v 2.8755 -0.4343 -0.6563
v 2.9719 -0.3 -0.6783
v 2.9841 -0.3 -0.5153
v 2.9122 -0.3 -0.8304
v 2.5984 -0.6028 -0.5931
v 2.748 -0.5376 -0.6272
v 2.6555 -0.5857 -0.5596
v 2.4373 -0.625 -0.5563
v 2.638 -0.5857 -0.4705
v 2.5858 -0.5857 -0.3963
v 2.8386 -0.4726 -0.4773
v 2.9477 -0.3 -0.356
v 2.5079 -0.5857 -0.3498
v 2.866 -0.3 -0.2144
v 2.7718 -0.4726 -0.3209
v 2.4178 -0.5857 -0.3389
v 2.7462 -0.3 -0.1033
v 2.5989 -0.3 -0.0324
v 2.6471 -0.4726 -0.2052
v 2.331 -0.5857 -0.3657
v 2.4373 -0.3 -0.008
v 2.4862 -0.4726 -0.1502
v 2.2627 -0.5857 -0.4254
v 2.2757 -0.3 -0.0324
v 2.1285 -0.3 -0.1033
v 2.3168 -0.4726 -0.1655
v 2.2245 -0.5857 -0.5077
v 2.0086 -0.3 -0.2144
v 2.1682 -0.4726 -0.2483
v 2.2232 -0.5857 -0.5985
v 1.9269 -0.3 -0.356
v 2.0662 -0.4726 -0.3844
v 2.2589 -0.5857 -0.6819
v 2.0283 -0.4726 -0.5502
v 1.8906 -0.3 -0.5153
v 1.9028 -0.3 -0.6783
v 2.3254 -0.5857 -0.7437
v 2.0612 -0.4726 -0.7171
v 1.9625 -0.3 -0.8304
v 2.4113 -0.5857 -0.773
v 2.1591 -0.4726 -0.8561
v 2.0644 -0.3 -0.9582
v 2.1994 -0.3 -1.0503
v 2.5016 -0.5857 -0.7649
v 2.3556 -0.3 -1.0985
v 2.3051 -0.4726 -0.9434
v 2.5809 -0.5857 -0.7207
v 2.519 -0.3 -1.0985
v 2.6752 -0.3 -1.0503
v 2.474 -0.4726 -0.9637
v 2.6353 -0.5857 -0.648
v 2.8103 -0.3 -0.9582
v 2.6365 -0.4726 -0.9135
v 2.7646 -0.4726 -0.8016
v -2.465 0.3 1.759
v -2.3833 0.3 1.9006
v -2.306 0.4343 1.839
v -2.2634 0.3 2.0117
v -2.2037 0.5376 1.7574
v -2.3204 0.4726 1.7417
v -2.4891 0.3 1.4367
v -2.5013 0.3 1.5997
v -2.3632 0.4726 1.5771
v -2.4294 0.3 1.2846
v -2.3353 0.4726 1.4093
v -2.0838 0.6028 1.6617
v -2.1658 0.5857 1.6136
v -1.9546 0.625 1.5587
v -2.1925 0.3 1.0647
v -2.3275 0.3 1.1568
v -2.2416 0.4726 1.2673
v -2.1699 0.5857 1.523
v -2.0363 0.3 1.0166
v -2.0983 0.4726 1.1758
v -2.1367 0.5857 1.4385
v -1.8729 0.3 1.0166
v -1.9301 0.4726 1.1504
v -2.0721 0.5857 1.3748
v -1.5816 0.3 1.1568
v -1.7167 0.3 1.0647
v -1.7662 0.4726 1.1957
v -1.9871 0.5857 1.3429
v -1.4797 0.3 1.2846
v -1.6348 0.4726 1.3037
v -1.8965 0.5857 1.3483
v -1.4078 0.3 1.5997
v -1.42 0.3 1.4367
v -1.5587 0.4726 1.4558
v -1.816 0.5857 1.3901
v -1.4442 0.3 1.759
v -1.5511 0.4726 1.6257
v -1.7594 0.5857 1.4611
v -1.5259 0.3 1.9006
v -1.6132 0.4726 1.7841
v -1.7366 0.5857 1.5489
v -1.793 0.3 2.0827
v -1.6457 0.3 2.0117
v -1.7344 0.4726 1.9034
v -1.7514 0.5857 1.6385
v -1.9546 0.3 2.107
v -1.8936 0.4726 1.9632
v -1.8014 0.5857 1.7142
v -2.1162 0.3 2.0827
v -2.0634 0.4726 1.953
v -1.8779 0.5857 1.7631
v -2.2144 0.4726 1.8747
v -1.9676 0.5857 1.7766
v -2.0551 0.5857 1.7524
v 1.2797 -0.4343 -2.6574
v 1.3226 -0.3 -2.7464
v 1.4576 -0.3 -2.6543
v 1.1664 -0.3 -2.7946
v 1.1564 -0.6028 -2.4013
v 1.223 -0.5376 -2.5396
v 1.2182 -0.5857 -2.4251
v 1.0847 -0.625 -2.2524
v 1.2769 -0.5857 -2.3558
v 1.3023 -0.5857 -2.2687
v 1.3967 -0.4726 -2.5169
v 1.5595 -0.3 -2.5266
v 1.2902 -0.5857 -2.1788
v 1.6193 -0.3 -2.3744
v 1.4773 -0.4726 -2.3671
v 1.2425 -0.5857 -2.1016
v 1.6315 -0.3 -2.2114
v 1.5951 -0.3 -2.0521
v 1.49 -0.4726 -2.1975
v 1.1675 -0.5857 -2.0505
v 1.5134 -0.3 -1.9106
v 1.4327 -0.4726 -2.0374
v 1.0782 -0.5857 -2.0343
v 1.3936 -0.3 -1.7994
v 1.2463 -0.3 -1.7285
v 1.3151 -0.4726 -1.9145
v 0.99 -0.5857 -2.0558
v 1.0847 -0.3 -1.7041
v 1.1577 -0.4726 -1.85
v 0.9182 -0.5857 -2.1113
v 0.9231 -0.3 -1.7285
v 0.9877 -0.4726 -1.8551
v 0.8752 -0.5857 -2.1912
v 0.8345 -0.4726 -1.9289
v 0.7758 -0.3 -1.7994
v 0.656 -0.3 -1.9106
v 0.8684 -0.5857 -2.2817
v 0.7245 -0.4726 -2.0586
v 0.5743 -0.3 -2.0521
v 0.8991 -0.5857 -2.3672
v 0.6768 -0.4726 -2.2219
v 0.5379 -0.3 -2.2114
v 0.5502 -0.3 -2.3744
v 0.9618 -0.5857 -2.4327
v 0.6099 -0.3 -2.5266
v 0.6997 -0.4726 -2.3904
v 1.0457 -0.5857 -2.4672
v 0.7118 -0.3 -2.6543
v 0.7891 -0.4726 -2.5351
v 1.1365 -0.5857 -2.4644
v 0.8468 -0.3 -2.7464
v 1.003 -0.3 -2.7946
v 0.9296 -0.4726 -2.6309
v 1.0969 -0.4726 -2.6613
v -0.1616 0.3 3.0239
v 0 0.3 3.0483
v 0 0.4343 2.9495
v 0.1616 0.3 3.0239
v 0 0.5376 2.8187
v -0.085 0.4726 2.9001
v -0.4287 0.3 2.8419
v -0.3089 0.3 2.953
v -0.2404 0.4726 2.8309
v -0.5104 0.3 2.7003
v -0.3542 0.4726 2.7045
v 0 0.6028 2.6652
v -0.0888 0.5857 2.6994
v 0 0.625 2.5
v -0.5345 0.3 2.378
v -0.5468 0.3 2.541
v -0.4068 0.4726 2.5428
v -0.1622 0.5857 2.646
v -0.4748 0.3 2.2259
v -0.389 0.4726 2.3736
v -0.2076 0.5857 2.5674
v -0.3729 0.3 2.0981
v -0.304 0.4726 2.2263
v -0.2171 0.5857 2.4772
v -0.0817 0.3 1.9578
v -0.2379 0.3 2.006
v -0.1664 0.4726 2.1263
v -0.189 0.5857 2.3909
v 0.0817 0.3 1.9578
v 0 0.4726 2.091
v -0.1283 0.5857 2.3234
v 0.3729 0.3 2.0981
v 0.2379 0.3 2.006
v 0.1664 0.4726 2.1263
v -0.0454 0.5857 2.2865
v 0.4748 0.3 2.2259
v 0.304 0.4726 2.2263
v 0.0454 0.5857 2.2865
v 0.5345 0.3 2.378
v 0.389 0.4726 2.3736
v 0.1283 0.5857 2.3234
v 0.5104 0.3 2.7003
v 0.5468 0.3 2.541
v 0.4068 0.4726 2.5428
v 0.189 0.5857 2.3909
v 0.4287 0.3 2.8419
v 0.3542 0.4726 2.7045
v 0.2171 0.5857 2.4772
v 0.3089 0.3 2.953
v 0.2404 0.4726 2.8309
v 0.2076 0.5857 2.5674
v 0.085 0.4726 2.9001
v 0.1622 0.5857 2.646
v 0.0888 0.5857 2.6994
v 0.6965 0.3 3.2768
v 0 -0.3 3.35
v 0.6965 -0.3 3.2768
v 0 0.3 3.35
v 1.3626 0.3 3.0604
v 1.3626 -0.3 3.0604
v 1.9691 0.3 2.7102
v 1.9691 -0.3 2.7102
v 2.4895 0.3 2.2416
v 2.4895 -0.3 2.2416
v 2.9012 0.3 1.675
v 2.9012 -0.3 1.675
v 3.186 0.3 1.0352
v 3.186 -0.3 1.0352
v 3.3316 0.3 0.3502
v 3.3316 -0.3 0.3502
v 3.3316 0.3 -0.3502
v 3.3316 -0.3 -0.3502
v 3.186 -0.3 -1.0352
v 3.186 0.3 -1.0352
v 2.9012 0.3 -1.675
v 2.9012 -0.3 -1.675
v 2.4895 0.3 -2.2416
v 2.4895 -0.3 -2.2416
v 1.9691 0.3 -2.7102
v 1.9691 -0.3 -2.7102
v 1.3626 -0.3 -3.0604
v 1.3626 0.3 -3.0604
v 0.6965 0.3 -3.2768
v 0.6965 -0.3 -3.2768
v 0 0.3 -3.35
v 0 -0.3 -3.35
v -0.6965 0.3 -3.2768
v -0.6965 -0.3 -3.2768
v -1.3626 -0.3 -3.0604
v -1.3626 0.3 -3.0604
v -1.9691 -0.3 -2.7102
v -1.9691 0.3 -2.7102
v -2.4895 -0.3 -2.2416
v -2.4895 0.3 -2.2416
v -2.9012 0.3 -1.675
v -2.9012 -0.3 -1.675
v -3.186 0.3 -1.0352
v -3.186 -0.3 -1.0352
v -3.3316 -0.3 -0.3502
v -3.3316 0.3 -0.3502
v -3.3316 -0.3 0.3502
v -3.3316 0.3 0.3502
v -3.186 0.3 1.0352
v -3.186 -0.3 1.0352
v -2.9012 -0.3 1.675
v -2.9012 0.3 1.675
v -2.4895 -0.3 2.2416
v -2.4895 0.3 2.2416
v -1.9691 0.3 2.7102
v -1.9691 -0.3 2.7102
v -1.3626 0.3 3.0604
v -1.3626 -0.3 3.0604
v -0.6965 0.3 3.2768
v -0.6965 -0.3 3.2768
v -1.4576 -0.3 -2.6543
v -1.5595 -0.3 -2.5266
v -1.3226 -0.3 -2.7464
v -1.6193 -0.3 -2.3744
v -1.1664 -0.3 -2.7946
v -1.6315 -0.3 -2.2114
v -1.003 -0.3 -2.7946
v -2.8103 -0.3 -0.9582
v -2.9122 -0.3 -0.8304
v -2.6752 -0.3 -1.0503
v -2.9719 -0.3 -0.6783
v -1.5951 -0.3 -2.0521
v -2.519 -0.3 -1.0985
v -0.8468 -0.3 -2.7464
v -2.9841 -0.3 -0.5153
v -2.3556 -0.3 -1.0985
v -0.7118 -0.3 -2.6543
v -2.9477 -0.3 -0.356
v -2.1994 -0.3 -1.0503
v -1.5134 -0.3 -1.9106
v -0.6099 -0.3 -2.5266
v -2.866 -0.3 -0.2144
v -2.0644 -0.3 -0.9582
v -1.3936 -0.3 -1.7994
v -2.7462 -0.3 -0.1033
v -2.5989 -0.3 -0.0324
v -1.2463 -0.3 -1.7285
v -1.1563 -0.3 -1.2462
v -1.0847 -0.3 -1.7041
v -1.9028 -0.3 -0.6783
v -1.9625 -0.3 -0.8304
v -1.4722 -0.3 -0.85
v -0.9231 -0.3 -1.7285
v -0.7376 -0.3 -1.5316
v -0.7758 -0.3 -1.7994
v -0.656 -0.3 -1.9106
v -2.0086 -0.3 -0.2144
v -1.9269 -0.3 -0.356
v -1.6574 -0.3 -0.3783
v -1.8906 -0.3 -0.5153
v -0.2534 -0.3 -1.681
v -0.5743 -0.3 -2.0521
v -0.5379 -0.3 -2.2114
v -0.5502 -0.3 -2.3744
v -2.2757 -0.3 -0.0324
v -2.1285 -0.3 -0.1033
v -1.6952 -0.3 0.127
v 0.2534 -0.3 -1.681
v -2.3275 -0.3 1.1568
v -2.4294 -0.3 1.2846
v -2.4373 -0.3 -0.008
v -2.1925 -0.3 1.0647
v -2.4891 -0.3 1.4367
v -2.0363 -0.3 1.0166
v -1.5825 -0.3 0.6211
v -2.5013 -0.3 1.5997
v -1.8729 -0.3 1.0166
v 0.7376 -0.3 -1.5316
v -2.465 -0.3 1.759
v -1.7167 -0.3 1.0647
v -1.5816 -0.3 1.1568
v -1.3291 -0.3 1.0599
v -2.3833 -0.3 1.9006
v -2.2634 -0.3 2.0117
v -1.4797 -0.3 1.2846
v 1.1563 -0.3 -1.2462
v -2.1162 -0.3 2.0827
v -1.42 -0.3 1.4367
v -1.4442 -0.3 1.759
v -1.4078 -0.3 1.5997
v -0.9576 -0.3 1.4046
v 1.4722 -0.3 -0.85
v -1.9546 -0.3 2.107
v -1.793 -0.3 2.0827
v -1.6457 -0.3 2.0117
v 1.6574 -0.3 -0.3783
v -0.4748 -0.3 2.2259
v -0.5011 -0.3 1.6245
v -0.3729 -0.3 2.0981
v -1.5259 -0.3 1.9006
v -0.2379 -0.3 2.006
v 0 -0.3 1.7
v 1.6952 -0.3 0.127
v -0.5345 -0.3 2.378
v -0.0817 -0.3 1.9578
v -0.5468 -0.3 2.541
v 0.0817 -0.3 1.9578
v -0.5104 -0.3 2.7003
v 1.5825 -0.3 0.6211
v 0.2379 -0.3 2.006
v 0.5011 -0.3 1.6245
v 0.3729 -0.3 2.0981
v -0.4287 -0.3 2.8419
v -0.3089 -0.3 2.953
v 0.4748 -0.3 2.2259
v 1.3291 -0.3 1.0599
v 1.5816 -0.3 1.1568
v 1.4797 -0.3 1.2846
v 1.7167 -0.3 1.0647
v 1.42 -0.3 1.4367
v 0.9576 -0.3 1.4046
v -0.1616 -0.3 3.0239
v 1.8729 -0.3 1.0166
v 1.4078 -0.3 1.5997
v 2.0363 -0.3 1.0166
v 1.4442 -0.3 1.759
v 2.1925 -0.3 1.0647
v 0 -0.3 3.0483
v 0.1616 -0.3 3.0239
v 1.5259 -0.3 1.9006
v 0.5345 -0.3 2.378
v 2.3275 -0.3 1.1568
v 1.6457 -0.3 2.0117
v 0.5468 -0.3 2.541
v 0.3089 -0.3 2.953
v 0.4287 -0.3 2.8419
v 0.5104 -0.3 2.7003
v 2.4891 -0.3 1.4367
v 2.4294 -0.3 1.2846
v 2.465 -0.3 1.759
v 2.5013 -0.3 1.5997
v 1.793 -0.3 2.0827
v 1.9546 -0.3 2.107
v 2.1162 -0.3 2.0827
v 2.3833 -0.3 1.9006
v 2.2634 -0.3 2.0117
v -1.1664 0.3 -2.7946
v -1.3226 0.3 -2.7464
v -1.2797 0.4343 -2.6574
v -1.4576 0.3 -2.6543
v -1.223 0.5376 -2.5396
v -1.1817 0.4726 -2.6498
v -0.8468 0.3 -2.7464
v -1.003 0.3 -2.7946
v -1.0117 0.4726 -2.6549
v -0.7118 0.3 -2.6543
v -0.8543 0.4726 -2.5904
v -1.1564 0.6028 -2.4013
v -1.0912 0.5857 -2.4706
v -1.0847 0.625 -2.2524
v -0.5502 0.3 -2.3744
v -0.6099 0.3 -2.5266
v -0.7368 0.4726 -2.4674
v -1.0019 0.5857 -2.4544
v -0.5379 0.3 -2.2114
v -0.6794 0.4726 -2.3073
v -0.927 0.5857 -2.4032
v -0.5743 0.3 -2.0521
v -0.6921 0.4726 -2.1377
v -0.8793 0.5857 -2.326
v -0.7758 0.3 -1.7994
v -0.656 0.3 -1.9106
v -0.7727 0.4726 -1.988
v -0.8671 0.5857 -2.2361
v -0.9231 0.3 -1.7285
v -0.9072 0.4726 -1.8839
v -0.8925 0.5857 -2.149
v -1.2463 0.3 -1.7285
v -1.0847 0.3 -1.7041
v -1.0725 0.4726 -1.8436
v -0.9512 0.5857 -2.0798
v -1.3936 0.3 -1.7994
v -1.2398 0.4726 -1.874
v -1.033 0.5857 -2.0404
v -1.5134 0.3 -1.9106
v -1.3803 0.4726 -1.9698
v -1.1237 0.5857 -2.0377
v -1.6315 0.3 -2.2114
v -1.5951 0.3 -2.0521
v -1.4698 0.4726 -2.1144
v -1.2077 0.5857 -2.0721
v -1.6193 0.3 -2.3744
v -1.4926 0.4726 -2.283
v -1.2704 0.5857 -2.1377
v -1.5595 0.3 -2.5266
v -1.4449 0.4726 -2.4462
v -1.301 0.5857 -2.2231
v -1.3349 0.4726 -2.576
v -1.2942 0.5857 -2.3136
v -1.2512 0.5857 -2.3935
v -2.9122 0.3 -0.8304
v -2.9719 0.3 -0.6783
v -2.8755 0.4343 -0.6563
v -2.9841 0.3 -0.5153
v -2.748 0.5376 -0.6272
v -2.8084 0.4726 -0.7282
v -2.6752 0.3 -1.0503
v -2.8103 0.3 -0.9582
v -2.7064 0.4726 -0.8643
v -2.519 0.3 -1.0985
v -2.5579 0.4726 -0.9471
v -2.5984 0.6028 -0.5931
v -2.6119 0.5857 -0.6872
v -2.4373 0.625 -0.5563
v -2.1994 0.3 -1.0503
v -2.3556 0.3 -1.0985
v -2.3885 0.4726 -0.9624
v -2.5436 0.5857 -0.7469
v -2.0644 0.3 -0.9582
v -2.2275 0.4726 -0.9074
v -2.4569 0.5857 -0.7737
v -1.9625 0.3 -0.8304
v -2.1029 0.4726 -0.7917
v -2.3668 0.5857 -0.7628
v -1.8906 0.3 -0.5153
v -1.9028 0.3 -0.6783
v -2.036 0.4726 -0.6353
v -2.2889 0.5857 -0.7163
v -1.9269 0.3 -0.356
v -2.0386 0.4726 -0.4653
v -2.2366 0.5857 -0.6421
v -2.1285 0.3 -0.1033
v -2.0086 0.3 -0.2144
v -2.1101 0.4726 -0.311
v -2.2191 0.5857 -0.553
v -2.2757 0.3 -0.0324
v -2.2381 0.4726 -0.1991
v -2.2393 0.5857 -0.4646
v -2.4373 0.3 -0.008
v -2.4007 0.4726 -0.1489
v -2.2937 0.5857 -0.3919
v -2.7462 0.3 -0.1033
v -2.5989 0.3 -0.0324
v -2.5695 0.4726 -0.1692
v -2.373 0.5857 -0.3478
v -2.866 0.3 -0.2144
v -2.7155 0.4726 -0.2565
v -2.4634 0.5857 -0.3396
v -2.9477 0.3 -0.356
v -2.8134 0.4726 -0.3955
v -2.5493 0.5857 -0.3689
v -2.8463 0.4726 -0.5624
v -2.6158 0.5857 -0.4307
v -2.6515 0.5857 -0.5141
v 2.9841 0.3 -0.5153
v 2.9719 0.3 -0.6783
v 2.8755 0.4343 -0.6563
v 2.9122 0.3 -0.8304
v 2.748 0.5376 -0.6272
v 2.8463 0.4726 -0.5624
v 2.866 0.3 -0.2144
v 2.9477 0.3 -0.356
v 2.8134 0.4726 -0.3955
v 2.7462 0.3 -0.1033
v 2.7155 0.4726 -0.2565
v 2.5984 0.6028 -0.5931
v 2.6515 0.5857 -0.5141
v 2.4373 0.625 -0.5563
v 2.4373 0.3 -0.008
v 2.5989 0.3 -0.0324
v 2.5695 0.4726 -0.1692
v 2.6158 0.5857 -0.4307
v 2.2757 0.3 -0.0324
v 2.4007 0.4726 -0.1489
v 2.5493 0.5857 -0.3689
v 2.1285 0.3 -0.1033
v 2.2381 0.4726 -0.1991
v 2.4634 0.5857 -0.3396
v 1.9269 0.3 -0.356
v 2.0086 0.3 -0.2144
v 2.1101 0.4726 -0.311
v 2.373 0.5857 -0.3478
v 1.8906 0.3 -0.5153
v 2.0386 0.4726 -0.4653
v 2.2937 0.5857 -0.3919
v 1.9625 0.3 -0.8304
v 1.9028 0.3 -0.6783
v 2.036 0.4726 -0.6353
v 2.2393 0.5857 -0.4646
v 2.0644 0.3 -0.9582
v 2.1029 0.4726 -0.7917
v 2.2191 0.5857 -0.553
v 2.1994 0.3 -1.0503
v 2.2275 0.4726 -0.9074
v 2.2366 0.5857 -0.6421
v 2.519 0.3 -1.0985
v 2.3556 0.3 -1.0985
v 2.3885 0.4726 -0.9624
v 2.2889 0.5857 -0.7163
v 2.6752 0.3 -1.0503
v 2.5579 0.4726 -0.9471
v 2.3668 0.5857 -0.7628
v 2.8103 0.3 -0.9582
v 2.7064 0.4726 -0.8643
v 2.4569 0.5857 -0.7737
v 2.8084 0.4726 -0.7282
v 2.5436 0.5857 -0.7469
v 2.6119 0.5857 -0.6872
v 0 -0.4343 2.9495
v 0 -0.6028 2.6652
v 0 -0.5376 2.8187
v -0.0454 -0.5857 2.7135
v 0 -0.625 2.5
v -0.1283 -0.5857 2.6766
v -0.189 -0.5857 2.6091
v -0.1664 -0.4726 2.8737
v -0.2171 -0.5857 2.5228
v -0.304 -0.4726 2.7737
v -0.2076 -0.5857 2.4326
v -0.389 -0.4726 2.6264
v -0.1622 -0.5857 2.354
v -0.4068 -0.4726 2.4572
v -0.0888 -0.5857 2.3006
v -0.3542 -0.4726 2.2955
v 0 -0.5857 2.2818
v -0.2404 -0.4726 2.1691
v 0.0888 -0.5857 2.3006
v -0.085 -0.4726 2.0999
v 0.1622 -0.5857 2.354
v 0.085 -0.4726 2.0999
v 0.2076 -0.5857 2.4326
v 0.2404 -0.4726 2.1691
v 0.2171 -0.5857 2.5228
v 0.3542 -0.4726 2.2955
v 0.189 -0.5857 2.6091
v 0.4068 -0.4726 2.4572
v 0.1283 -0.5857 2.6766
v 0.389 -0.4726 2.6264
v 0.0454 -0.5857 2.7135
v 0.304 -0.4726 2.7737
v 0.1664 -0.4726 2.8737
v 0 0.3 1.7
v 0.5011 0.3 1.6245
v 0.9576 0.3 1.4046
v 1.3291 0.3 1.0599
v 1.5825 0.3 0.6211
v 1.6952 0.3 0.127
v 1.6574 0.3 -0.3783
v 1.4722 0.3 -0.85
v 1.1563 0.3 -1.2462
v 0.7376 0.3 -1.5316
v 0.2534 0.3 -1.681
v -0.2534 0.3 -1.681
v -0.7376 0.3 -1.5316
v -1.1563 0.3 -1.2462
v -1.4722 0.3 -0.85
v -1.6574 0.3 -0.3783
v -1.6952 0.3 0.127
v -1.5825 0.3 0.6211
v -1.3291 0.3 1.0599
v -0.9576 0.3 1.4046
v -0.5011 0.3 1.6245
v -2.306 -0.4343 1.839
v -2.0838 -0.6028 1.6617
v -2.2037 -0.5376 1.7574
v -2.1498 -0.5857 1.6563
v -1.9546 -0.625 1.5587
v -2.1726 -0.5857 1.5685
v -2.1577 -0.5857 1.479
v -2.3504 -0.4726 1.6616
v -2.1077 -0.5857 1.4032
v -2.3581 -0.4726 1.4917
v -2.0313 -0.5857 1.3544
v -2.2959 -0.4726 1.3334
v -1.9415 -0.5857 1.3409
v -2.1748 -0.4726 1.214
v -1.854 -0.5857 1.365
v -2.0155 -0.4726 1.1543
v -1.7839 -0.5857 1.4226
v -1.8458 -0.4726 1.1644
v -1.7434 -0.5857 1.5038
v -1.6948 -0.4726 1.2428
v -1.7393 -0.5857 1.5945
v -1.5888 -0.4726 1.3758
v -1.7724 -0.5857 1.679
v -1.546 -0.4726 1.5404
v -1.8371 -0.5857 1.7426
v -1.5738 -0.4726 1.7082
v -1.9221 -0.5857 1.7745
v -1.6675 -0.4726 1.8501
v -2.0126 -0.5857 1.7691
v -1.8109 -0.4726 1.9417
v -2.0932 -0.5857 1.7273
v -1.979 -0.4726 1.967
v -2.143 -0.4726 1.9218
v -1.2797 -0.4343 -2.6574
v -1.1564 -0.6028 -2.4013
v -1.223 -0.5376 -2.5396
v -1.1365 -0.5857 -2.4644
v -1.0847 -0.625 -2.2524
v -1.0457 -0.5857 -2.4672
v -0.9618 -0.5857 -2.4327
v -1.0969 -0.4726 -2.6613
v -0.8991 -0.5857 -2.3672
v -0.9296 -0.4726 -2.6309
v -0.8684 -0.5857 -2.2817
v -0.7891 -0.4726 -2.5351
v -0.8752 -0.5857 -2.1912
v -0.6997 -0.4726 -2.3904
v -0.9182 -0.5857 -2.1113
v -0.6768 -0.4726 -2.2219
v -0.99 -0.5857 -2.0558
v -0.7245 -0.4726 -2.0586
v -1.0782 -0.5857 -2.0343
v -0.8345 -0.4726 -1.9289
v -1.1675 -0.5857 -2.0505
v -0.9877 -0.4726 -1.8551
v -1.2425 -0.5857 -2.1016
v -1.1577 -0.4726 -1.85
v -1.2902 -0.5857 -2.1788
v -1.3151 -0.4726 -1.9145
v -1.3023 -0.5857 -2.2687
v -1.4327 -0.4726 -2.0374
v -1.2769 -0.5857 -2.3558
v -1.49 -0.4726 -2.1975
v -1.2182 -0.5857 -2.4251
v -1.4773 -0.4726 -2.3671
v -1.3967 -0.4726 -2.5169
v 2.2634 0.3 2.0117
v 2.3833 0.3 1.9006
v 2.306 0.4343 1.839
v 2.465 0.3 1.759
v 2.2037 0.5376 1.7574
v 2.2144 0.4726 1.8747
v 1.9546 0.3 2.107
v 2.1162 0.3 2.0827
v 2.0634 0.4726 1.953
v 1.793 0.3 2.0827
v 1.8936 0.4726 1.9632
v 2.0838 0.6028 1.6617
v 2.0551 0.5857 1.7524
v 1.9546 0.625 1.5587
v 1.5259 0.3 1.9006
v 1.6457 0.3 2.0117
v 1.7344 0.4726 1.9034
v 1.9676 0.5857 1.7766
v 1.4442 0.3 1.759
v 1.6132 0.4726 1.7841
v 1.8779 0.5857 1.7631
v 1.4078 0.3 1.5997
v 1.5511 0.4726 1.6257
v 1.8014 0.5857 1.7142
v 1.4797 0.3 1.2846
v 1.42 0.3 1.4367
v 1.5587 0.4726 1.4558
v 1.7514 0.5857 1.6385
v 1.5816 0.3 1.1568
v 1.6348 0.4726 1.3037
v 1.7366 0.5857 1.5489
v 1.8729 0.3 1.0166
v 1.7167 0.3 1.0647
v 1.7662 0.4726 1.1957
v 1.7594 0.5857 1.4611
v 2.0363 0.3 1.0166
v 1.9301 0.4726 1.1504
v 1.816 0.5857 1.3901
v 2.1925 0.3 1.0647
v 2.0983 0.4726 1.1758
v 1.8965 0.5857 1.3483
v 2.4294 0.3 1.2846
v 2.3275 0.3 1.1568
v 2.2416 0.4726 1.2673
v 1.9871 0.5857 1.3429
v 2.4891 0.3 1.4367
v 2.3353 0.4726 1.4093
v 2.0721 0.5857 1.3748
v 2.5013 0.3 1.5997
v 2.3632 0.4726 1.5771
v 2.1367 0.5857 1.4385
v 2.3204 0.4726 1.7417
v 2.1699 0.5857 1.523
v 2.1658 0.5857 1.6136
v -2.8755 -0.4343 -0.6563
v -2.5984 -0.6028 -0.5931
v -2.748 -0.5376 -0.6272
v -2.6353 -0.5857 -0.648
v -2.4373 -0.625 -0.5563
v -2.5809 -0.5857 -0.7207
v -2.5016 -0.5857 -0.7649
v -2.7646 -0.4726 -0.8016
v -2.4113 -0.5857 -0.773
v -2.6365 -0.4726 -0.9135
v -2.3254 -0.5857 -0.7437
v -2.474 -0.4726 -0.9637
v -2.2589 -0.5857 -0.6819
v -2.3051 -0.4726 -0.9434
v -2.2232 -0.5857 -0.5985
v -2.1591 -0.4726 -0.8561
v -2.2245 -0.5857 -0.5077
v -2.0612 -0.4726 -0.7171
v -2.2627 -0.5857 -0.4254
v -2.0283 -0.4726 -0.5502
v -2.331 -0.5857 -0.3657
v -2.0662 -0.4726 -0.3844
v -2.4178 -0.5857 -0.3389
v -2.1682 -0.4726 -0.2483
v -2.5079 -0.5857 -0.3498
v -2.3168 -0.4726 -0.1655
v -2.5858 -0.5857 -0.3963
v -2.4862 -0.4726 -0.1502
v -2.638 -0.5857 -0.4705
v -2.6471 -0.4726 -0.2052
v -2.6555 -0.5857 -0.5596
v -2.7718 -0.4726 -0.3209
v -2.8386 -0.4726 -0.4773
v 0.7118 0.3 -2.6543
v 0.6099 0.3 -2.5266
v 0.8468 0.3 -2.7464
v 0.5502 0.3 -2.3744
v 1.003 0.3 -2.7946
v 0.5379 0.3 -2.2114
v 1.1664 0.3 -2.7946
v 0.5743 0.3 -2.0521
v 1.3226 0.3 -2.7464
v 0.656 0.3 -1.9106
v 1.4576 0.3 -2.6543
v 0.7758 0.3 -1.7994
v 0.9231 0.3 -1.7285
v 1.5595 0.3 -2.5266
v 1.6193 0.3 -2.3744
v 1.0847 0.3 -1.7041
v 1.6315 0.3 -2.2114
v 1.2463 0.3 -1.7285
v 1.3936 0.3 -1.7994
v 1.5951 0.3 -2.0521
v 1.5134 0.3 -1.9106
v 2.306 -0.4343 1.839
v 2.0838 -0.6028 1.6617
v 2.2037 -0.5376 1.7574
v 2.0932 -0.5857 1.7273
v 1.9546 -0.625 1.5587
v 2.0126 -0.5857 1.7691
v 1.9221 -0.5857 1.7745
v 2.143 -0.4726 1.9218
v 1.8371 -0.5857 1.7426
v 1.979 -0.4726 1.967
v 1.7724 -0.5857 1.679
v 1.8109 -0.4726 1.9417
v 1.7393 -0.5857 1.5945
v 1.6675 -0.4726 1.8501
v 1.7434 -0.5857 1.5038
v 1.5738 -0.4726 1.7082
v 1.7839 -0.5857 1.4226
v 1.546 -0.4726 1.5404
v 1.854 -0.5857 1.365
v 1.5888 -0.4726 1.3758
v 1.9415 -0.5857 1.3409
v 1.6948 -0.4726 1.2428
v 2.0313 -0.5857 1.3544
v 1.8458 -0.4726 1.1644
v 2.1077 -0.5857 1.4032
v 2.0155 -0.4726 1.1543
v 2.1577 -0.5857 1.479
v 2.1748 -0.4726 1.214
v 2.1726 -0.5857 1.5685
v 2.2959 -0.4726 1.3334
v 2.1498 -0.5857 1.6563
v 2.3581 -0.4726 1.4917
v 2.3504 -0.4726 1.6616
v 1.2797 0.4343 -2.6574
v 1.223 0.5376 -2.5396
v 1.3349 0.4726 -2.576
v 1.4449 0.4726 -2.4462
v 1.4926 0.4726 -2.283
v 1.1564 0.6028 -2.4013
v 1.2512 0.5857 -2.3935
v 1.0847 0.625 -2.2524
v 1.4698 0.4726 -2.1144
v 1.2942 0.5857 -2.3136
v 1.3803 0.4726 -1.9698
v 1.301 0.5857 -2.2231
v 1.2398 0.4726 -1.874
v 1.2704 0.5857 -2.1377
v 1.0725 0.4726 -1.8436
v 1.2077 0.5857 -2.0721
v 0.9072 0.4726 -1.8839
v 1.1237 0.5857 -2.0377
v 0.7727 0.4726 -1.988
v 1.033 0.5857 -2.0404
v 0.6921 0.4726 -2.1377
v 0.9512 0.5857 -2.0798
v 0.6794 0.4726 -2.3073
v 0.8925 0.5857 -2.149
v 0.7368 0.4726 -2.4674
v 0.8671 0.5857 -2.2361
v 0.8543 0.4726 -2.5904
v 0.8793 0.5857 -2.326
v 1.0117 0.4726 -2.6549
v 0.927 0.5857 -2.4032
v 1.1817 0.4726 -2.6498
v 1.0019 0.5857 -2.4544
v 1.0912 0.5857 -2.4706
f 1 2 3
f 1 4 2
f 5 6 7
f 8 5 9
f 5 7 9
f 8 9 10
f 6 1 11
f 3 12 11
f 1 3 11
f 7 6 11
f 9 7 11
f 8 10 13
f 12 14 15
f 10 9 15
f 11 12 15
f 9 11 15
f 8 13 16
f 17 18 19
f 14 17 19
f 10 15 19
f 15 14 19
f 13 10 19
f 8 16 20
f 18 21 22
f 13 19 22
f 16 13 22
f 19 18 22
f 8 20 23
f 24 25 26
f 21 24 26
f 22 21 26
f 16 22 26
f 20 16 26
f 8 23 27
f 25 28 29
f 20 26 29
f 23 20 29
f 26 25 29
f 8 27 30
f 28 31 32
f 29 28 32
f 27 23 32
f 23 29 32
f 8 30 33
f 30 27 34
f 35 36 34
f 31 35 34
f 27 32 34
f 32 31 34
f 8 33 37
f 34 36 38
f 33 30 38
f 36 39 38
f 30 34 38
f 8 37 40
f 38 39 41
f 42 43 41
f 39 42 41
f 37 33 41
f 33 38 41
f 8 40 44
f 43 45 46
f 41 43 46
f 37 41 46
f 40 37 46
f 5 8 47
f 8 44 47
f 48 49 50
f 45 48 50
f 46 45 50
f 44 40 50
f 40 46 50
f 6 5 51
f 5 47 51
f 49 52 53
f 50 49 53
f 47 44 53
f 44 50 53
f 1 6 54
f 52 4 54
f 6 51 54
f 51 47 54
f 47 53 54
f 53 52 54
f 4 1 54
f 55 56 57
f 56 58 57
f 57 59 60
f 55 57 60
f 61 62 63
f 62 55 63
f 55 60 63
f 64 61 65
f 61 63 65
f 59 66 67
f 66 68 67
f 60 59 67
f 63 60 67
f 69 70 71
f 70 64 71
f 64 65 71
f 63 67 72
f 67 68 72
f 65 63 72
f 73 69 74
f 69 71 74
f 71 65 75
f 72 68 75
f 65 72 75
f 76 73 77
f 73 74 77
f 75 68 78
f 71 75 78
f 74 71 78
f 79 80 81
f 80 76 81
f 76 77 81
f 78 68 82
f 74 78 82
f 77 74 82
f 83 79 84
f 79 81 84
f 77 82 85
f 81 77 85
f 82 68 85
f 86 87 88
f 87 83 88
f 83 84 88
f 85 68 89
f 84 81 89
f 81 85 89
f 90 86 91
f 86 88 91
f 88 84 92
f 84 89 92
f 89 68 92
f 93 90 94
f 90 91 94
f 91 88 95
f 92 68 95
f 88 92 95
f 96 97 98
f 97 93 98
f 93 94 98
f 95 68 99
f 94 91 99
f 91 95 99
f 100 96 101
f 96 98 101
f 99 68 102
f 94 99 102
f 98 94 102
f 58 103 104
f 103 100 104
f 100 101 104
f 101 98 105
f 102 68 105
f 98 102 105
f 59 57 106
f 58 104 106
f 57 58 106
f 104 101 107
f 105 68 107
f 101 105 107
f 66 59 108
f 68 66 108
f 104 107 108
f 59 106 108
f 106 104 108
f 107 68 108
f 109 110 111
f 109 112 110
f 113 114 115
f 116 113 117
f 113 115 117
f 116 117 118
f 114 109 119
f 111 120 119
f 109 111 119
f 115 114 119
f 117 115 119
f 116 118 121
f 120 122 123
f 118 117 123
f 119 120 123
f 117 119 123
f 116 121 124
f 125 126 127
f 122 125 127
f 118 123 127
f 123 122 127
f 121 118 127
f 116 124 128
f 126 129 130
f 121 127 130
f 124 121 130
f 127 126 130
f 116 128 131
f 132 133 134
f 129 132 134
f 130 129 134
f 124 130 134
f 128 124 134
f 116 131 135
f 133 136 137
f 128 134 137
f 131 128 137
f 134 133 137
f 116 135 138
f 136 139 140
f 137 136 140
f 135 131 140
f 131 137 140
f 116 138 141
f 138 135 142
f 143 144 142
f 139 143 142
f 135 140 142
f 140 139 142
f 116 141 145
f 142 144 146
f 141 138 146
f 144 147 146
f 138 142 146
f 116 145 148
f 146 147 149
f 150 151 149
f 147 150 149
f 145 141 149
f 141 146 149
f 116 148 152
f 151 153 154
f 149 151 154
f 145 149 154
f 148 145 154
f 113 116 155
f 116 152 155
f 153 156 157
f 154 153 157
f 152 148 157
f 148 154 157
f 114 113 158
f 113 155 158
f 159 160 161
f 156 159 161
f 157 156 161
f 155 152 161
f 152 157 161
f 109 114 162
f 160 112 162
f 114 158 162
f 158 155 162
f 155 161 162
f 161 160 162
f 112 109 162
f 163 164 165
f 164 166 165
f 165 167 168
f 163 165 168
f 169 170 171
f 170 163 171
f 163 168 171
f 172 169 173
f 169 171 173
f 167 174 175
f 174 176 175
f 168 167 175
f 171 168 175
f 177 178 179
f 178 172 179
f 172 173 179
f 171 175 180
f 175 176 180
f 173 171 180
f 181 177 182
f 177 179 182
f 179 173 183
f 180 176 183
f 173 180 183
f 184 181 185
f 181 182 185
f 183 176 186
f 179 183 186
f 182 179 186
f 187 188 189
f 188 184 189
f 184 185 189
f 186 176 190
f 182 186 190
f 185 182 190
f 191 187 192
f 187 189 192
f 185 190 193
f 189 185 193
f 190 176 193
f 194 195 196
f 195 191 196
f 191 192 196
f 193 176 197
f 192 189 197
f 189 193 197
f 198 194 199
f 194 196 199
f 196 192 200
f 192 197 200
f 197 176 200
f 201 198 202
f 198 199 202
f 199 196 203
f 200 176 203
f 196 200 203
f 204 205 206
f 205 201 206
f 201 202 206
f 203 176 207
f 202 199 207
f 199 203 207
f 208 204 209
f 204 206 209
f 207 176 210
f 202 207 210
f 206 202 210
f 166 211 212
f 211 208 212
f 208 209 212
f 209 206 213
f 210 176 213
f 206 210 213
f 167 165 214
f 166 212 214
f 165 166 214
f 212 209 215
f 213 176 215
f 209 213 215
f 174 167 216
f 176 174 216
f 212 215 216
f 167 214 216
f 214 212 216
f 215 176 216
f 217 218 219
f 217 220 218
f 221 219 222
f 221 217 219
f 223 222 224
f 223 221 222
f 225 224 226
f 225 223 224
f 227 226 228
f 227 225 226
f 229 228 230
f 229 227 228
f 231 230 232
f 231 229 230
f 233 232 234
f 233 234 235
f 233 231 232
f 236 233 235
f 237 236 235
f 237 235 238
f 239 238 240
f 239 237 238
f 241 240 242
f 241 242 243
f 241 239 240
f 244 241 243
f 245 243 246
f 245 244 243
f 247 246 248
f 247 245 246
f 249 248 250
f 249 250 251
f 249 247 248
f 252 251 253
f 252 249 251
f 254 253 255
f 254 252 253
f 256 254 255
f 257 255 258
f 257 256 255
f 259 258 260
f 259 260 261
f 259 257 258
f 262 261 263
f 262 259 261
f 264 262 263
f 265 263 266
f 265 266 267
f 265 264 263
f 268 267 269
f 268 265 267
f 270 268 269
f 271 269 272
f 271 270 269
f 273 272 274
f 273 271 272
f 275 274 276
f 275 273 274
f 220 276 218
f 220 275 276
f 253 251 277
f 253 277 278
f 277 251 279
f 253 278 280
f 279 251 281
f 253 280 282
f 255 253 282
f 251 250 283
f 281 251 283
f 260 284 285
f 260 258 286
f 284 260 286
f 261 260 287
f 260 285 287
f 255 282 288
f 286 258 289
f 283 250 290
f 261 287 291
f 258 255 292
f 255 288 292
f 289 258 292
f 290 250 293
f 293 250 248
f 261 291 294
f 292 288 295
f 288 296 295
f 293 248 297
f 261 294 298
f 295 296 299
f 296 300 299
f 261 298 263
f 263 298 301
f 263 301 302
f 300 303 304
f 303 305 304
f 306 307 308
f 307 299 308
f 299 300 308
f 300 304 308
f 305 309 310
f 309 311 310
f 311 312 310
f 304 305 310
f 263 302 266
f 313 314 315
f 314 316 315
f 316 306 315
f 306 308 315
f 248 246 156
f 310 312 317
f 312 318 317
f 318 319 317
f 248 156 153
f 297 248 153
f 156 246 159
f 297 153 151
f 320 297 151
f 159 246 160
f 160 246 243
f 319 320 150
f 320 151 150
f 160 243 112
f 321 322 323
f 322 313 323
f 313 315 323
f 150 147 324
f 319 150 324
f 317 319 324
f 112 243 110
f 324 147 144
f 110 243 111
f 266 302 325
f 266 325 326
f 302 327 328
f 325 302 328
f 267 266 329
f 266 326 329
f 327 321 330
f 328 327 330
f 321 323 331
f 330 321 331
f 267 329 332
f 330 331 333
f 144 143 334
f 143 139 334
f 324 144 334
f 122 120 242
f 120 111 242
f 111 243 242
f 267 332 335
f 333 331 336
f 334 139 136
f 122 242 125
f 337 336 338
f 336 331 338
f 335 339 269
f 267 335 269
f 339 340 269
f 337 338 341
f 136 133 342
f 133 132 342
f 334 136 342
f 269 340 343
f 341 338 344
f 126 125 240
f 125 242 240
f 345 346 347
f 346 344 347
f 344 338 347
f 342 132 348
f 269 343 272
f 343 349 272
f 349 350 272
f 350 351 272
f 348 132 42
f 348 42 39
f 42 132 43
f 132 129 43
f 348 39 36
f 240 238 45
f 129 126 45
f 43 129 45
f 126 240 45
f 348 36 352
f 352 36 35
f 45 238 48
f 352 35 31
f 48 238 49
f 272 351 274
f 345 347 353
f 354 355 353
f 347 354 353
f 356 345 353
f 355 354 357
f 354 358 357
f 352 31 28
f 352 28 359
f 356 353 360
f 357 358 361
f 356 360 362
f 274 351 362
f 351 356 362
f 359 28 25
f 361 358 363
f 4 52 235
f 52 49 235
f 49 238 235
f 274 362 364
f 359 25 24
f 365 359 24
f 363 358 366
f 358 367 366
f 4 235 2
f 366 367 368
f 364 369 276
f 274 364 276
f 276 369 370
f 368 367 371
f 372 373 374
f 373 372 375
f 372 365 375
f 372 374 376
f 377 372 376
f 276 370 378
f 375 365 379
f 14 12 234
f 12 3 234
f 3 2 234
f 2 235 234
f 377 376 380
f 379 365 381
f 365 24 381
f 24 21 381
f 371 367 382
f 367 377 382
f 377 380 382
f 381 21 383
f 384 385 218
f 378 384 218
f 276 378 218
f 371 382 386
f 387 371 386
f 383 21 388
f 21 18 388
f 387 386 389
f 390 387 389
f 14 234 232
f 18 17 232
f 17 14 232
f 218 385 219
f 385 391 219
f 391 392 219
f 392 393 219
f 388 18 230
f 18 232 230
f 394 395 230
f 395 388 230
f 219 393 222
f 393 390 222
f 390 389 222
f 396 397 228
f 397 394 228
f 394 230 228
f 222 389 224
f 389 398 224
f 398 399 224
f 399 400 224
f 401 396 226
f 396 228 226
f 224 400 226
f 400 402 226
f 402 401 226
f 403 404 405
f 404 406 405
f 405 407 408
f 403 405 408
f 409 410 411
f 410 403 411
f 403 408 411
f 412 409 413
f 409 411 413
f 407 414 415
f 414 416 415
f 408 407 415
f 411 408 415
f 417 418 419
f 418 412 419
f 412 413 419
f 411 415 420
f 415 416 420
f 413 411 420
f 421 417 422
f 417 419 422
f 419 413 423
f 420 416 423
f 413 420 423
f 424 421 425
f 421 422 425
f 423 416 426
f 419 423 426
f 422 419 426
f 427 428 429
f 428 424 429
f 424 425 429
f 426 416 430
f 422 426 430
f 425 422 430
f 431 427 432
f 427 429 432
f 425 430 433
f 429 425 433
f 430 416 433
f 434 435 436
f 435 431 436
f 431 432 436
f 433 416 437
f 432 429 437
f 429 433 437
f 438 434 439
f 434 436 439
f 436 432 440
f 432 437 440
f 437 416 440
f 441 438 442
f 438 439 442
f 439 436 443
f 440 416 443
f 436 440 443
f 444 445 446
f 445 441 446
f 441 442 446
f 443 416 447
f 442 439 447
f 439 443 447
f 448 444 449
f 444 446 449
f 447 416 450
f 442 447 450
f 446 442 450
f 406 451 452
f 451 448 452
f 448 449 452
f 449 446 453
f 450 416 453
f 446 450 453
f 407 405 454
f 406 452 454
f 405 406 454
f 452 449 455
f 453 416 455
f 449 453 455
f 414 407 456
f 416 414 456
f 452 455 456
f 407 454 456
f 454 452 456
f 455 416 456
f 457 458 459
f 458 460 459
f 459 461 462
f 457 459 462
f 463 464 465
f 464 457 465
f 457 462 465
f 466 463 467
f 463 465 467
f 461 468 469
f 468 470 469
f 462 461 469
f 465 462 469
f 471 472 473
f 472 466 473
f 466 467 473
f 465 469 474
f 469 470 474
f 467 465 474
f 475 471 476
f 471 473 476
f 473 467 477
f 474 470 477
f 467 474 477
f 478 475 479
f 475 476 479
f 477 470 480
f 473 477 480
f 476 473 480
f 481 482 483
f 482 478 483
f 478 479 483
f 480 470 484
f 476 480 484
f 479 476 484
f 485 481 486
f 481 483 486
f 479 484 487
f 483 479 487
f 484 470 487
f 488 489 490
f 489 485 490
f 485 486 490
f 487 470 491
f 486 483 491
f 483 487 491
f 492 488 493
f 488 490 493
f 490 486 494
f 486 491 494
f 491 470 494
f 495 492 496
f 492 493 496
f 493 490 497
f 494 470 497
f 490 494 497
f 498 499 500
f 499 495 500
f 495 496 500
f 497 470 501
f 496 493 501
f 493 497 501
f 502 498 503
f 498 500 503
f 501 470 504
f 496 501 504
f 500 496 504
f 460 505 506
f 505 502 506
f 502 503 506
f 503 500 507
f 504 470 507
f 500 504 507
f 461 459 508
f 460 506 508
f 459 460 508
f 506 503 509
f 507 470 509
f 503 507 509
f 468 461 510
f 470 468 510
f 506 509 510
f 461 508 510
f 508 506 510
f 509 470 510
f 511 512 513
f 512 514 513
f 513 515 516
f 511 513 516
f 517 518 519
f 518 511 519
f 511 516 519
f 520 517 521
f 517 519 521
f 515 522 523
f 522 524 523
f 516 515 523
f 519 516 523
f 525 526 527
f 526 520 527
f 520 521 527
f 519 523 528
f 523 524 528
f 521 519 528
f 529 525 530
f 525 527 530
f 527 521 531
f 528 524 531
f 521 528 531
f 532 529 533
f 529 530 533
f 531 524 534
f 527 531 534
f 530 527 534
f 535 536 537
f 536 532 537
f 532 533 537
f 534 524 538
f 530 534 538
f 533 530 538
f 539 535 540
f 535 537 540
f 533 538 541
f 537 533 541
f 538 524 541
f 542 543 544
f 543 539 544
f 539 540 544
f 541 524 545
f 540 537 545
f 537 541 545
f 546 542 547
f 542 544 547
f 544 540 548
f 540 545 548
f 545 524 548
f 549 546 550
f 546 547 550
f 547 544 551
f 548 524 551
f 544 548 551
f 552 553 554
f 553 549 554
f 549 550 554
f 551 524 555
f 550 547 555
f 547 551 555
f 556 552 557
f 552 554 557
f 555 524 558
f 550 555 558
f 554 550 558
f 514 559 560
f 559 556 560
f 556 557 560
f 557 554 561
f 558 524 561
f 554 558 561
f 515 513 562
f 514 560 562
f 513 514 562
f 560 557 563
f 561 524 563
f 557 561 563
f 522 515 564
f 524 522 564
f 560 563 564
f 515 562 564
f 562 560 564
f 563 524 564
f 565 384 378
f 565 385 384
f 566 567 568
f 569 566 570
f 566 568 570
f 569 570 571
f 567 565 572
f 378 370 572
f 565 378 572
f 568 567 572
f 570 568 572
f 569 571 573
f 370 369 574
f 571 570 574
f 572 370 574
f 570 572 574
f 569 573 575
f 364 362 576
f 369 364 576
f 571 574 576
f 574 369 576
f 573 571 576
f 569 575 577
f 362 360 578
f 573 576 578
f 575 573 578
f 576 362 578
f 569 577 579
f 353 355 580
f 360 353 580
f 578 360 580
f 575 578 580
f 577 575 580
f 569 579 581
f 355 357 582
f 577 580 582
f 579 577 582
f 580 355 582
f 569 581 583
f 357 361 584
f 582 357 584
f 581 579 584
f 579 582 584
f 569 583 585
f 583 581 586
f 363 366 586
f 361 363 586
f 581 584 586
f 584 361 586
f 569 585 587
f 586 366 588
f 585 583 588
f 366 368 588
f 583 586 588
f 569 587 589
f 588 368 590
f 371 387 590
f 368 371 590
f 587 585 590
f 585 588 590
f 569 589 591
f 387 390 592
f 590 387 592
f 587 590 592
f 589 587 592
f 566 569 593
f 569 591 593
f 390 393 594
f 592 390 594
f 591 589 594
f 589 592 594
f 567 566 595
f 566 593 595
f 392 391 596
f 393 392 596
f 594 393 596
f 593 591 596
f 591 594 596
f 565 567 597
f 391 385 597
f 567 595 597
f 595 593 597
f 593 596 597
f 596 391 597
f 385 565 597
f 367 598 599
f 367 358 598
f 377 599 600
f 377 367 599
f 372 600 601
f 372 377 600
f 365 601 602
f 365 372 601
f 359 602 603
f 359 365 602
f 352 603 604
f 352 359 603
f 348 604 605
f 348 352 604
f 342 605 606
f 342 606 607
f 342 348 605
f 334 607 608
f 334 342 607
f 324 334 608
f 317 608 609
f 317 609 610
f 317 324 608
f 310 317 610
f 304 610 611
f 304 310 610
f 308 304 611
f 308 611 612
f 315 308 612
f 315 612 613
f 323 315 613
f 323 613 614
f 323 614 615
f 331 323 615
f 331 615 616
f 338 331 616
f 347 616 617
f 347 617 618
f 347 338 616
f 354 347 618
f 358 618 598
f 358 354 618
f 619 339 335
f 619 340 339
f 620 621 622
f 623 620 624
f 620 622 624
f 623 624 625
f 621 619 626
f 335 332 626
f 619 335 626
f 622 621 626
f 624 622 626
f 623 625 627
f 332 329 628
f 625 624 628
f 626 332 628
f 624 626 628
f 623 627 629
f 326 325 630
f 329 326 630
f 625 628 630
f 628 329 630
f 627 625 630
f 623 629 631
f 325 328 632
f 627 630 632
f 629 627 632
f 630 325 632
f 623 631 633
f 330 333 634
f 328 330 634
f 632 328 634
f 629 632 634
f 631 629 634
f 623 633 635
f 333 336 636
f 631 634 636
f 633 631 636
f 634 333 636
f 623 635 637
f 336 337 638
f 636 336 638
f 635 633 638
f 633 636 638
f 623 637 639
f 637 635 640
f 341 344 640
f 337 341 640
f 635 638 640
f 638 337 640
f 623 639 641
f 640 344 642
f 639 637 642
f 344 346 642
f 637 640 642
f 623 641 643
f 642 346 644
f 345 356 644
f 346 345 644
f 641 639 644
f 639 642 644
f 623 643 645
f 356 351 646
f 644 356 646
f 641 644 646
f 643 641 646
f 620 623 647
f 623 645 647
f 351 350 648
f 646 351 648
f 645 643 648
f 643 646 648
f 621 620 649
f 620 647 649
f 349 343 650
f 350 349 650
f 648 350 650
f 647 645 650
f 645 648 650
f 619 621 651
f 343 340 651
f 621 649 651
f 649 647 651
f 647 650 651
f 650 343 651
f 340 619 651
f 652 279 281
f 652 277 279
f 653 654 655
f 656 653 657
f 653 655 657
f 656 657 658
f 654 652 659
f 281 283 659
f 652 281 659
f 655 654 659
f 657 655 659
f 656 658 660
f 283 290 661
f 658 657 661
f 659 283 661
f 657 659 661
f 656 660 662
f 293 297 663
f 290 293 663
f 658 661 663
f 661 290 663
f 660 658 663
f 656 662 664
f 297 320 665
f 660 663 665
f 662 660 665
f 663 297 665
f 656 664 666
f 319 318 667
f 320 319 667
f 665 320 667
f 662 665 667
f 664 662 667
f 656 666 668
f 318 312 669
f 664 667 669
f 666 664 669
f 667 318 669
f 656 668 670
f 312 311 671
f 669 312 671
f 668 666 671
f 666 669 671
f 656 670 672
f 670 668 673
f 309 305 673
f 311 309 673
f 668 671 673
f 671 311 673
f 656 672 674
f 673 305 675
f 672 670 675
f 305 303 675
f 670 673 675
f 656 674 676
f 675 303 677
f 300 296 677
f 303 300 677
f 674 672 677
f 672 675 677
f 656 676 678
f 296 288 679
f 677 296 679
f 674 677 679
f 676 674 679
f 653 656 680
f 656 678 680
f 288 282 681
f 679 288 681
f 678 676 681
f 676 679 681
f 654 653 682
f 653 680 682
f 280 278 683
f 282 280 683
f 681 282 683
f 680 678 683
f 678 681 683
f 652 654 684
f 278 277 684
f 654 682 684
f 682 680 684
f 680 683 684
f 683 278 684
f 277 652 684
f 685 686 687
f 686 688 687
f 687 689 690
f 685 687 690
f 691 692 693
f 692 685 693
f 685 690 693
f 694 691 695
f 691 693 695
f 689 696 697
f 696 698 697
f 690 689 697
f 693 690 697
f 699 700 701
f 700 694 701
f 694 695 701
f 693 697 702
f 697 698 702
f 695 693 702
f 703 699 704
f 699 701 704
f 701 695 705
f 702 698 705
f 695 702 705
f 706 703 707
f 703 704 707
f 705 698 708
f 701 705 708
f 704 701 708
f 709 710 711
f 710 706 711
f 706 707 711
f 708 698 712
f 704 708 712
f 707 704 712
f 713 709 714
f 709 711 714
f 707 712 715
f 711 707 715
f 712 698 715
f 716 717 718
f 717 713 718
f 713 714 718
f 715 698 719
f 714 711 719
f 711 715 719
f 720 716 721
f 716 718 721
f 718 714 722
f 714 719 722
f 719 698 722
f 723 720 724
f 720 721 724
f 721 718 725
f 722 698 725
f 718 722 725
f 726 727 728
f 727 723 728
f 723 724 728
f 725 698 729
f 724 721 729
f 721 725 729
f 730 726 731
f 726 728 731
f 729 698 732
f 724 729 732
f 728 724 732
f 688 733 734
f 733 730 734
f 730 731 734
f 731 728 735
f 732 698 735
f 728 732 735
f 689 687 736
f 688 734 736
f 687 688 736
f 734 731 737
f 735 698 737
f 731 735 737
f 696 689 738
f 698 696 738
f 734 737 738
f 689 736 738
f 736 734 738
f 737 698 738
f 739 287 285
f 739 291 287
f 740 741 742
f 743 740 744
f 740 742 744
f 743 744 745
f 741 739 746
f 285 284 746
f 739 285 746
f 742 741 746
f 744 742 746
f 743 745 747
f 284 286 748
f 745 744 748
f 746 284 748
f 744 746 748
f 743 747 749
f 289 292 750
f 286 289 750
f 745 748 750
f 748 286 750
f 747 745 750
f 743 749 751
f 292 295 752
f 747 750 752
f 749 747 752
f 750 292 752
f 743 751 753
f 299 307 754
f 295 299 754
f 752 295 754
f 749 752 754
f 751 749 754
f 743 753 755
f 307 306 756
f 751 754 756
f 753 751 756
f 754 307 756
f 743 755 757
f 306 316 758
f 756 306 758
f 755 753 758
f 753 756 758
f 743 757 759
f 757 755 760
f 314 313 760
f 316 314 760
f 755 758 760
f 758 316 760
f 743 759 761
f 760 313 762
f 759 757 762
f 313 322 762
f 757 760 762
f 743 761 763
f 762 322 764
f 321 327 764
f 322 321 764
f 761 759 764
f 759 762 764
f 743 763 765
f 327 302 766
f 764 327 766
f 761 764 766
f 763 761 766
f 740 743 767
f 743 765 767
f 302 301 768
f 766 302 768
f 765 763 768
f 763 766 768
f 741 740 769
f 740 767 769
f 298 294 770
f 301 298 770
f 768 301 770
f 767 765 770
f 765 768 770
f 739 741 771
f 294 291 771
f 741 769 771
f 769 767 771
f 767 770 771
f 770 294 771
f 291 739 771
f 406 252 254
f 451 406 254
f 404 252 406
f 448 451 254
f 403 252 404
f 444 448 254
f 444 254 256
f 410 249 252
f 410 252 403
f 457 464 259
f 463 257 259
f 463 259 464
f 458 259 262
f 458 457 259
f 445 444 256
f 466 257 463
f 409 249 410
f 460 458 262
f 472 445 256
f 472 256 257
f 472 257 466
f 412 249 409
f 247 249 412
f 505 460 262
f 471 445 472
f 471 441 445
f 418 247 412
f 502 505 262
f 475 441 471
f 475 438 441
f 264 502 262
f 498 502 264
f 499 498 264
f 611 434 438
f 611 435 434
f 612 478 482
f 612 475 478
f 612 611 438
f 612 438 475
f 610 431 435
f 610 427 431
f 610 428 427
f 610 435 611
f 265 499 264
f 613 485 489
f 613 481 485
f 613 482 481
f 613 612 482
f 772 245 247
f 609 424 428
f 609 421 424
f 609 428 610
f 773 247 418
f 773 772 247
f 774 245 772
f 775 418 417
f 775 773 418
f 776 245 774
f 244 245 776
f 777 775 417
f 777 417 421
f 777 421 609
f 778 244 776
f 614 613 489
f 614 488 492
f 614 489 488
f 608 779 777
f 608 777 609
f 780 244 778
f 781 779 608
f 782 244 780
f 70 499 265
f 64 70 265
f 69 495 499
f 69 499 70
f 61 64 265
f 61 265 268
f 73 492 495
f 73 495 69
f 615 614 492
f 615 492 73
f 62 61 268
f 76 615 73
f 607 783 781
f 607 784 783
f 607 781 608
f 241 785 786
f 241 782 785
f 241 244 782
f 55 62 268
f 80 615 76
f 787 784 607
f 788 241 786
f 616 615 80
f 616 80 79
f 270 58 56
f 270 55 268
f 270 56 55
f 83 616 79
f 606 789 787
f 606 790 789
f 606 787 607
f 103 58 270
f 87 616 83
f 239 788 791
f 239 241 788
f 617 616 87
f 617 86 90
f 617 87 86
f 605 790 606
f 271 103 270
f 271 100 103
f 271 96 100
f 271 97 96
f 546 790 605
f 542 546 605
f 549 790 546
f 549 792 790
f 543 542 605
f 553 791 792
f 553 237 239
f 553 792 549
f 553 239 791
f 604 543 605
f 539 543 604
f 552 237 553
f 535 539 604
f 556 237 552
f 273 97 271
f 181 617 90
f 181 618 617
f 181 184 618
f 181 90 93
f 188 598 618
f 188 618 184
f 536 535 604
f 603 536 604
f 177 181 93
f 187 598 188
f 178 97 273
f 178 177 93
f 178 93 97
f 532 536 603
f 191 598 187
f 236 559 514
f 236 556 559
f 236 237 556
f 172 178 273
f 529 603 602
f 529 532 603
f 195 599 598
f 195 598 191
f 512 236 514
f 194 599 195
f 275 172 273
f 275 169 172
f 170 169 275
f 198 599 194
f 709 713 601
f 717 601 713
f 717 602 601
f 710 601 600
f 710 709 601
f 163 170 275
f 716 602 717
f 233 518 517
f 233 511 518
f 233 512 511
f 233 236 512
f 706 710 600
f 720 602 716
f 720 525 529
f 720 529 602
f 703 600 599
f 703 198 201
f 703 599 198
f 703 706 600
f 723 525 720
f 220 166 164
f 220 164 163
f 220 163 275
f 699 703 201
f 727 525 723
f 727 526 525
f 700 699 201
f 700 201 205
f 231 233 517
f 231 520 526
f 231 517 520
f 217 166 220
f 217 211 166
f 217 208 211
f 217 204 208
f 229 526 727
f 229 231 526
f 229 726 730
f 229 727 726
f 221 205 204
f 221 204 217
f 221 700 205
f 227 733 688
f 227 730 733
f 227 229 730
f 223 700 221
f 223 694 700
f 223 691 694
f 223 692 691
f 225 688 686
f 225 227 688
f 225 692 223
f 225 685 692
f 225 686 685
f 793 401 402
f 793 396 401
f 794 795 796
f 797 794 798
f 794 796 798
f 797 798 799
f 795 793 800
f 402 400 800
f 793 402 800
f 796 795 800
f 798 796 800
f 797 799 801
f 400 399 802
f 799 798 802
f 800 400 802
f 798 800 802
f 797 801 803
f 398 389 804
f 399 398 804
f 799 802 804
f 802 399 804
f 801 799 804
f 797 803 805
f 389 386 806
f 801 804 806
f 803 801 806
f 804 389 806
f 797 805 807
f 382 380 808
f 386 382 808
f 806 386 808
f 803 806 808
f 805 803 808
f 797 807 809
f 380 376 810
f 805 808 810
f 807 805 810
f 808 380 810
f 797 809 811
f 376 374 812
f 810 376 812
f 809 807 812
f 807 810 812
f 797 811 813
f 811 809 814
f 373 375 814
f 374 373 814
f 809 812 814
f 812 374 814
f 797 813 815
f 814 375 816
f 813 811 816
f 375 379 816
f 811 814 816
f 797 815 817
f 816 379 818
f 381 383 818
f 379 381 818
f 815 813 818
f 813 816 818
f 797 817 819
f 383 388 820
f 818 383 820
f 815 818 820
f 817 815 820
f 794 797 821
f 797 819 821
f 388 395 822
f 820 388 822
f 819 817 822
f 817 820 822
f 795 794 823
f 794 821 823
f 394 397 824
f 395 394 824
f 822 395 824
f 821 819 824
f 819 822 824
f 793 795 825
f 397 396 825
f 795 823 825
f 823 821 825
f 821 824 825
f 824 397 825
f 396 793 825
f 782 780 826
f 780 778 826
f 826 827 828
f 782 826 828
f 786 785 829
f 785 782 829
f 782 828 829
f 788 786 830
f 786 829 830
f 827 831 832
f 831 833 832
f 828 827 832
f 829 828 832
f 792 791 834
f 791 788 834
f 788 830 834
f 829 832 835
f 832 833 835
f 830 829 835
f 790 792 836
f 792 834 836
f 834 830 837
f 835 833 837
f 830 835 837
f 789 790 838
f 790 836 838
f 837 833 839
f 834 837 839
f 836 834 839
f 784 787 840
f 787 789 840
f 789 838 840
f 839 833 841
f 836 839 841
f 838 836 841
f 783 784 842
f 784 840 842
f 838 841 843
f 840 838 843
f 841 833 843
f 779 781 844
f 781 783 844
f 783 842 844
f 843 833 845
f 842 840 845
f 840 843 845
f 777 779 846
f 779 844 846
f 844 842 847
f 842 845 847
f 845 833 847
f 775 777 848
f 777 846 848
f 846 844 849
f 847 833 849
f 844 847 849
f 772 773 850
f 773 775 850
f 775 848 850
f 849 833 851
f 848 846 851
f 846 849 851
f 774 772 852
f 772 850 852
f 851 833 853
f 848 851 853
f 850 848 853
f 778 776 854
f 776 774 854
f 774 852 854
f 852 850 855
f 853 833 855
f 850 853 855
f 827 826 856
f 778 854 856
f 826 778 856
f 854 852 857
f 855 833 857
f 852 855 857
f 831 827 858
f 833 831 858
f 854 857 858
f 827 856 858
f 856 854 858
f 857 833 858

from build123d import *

# Parameters (mm, degrees)
SKETCH2_R           = 3.35
SKETCH2_R_2         = 1.7
BOSS_EXTRUDE1_DEPTH = 0.3
CIRPATTERN2_COUNT   = 7


with BuildPart() as part:
    # Sketch1 → Revolve1 (revolve)
    with BuildSketch(Plane(origin=(0, 0, 0), x_dir=(0, 0, -1), z_dir=(1, 0, 0))):
        with BuildLine():
            Line((-2.5, 0.625), (-2.5, -0.625))
            ThreePointArc((-2.5, -0.625), (-3.125, 0), (-2.5, 0.625))
        make_face()
    revolve1 = revolve(axis=Axis((0, 0.625, 2.5), (0, -1, 0)))

    # Sketch2 → Boss-Extrude1 (add, symmetric)
    with BuildSketch(Plane(origin=(0, 0, 0), x_dir=(1, 0, 0), z_dir=(0, 1, 0))):
        Circle(SKETCH2_R)
        Circle(SKETCH2_R_2, mode=Mode.SUBTRACT)
    extrude(amount=BOSS_EXTRUDE1_DEPTH, both=True)

    # CirPattern2: Revolve1 ×7 about axis
    cirpattern2_axis = Axis((0, 0.6875, 0), (0, -1, 0))
    for i in range(1, CIRPATTERN2_COUNT):
        add(revolve1.rotate(cirpattern2_axis, i * 360 / CIRPATTERN2_COUNT))


solid = part.part
